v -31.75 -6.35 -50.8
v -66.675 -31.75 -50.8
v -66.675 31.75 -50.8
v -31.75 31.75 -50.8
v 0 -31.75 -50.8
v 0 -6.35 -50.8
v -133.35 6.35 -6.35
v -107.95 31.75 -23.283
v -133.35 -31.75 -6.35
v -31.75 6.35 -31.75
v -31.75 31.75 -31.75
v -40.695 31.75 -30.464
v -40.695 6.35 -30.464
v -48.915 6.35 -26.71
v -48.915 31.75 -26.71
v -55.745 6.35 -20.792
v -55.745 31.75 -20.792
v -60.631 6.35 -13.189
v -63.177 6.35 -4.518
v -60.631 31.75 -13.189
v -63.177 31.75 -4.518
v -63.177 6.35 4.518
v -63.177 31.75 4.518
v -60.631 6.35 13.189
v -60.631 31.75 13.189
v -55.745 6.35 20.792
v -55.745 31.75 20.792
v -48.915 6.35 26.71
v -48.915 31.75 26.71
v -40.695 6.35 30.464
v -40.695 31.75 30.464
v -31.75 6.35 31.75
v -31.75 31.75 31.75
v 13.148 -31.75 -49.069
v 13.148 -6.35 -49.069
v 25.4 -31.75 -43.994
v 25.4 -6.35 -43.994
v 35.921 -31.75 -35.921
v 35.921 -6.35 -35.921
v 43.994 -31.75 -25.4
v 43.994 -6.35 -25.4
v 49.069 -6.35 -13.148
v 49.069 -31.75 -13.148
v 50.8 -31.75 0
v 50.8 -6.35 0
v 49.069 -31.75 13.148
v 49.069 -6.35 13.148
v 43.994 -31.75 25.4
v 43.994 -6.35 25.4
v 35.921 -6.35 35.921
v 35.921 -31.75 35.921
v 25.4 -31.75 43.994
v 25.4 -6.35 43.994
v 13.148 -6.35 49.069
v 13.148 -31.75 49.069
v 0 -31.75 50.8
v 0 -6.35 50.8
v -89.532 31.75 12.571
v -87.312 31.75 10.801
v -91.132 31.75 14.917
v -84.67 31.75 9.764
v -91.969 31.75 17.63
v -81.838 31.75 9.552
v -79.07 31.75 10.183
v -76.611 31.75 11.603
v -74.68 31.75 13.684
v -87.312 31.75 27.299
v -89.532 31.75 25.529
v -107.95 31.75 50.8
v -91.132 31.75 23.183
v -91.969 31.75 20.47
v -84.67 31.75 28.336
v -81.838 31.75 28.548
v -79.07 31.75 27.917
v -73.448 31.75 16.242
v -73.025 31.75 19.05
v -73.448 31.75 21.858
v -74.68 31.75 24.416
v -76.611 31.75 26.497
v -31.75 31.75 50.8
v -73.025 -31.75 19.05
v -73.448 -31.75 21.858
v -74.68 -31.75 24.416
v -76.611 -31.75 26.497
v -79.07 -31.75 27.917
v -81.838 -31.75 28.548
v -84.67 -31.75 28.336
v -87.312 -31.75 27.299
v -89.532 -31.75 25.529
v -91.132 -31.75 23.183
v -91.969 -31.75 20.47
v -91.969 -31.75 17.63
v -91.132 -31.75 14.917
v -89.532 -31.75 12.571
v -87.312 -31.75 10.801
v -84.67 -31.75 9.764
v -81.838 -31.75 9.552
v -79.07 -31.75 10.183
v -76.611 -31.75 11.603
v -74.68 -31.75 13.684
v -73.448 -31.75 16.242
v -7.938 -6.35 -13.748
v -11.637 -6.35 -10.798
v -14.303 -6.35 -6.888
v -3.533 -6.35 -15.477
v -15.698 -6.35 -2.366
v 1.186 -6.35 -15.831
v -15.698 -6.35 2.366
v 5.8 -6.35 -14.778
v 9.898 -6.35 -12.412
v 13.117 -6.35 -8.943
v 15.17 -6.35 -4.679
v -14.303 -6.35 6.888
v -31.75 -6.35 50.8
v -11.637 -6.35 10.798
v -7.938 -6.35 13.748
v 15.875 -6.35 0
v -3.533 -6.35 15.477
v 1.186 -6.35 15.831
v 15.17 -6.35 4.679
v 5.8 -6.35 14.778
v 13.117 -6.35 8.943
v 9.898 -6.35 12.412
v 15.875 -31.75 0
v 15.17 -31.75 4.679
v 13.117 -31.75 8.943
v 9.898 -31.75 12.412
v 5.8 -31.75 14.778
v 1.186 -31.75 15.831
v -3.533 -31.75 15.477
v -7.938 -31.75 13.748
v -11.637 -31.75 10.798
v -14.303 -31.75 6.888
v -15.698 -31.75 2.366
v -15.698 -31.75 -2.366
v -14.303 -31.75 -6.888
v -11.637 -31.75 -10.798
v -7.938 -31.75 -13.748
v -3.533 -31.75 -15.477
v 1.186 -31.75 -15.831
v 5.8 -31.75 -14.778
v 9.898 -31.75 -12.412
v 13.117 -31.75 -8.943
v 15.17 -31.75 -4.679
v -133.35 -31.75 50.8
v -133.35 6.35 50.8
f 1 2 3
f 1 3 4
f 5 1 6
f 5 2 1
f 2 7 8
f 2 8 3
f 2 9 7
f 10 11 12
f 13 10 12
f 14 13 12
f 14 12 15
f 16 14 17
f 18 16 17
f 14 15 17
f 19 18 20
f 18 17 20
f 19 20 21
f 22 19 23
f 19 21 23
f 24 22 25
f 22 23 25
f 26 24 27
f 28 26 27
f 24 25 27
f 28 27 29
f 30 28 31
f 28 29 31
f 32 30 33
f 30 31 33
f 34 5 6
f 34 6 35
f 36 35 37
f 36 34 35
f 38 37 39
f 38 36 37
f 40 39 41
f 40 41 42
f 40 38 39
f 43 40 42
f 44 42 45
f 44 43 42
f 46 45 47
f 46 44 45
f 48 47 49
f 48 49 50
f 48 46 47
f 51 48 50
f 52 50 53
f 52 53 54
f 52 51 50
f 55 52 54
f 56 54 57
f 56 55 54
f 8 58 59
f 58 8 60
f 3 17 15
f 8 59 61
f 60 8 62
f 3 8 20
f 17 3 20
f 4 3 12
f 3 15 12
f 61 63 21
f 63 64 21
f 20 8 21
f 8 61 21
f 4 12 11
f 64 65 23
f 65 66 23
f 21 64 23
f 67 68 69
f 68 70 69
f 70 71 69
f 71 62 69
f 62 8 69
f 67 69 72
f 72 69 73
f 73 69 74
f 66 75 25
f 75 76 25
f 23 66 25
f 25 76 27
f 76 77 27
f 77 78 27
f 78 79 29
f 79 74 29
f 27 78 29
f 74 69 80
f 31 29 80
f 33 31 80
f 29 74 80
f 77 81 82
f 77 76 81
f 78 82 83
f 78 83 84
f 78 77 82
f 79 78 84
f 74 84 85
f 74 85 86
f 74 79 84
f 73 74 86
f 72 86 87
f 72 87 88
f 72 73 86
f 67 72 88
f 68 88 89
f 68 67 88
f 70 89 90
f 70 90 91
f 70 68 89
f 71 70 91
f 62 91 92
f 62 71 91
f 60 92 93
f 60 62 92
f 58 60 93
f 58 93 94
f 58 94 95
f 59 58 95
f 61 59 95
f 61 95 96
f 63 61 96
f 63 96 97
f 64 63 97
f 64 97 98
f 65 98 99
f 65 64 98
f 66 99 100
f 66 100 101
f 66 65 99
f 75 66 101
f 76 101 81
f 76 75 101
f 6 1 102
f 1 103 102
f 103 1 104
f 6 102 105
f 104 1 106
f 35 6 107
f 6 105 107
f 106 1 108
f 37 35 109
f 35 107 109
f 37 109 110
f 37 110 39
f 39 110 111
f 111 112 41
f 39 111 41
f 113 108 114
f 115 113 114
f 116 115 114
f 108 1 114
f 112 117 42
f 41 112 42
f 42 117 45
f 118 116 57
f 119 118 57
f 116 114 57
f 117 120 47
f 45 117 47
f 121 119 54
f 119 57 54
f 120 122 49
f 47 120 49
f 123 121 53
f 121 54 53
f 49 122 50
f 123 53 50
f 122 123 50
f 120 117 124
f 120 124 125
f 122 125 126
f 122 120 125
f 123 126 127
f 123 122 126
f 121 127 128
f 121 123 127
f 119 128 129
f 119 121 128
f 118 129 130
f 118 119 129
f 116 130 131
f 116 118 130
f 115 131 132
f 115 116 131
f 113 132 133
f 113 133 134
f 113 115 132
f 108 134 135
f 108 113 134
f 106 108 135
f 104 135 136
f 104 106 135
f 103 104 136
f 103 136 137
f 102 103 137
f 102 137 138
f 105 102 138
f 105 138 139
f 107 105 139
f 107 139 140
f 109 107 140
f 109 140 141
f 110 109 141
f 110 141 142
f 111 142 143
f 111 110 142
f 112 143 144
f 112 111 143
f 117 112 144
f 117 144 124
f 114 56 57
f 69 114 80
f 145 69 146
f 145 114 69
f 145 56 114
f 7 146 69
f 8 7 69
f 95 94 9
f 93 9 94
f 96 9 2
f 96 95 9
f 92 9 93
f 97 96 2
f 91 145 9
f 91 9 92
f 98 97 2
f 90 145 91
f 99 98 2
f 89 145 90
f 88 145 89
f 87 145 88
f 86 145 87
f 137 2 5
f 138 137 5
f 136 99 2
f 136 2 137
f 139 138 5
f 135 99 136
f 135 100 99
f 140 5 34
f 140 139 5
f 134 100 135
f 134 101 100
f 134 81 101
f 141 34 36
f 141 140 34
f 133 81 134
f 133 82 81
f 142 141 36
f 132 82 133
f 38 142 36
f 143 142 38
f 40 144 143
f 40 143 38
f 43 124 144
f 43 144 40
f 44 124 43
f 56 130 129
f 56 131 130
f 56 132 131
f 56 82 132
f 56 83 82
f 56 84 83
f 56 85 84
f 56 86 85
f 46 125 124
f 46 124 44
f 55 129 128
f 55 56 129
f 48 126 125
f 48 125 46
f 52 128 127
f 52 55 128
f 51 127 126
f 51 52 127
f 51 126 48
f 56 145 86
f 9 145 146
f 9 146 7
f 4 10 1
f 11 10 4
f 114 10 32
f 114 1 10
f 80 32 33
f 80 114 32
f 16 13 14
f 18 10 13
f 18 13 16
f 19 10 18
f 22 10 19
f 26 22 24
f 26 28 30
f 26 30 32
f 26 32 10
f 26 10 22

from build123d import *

# Parameters (mm, degrees)
F0_R     = 9.525
F0_R_2   = 15.875
F1_DEPTH = 31.75
F2_W     = 50.8
F2_H     = 38.1
F2_W_2   = 31.75
F3_DEPTH = 127
F5_DEPTH = 25.4


with BuildPart() as f1:
    # F0 (on Front) → F1 (new body, symmetric)
    with BuildSketch(Plane.XZ):
        with BuildLine():
            Line((-66.675, -50.8), (0, -50.8))
            ThreePointArc((0, -50.8), (50.8, 0), (0, 50.8))
            Line((0, 50.8), (-133.35, 50.8))
            Line((-133.35, 50.8), (-133.35, -6.35))
            Line((-133.35, -6.35), (-66.675, -50.8))
        make_face()
        with Locations((-82.55, 19.05)):
            Circle(F0_R, mode=Mode.SUBTRACT)
        Circle(F0_R_2, mode=Mode.SUBTRACT)
    extrude(amount=F1_DEPTH, both=True)

    # F2 (on face) → F3 (cut)
    with BuildSketch(Plane.XY.offset(50.8)):
        Polygon((-133.35, 6.35), (-107.95, 31.75), (-133.35, 31.75), align=None)
        with Locations((25.4, 12.7)):
            Rectangle(F2_W, F2_H)
        with Locations((-15.875, 12.7)):
            Rectangle(F2_W_2, F2_H)
    extrude(amount=-F3_DEPTH, mode=Mode.SUBTRACT)

    # F4 (on face) → F5 (cut)
    with BuildSketch(Plane(origin=(0, 31.75, 0), x_dir=(-1, 0, 0), z_dir=(0, 1, 0))):
        with BuildLine():
            Line((31.75, 0), (31.75, -31.75))
            ThreePointArc((31.75, -31.75), (63.5, 0), (31.75, 31.75))
            Line((31.75, 31.75), (31.75, 0))
        make_face()
    extrude(amount=-F5_DEPTH, mode=Mode.SUBTRACT)


solid = f1.part
